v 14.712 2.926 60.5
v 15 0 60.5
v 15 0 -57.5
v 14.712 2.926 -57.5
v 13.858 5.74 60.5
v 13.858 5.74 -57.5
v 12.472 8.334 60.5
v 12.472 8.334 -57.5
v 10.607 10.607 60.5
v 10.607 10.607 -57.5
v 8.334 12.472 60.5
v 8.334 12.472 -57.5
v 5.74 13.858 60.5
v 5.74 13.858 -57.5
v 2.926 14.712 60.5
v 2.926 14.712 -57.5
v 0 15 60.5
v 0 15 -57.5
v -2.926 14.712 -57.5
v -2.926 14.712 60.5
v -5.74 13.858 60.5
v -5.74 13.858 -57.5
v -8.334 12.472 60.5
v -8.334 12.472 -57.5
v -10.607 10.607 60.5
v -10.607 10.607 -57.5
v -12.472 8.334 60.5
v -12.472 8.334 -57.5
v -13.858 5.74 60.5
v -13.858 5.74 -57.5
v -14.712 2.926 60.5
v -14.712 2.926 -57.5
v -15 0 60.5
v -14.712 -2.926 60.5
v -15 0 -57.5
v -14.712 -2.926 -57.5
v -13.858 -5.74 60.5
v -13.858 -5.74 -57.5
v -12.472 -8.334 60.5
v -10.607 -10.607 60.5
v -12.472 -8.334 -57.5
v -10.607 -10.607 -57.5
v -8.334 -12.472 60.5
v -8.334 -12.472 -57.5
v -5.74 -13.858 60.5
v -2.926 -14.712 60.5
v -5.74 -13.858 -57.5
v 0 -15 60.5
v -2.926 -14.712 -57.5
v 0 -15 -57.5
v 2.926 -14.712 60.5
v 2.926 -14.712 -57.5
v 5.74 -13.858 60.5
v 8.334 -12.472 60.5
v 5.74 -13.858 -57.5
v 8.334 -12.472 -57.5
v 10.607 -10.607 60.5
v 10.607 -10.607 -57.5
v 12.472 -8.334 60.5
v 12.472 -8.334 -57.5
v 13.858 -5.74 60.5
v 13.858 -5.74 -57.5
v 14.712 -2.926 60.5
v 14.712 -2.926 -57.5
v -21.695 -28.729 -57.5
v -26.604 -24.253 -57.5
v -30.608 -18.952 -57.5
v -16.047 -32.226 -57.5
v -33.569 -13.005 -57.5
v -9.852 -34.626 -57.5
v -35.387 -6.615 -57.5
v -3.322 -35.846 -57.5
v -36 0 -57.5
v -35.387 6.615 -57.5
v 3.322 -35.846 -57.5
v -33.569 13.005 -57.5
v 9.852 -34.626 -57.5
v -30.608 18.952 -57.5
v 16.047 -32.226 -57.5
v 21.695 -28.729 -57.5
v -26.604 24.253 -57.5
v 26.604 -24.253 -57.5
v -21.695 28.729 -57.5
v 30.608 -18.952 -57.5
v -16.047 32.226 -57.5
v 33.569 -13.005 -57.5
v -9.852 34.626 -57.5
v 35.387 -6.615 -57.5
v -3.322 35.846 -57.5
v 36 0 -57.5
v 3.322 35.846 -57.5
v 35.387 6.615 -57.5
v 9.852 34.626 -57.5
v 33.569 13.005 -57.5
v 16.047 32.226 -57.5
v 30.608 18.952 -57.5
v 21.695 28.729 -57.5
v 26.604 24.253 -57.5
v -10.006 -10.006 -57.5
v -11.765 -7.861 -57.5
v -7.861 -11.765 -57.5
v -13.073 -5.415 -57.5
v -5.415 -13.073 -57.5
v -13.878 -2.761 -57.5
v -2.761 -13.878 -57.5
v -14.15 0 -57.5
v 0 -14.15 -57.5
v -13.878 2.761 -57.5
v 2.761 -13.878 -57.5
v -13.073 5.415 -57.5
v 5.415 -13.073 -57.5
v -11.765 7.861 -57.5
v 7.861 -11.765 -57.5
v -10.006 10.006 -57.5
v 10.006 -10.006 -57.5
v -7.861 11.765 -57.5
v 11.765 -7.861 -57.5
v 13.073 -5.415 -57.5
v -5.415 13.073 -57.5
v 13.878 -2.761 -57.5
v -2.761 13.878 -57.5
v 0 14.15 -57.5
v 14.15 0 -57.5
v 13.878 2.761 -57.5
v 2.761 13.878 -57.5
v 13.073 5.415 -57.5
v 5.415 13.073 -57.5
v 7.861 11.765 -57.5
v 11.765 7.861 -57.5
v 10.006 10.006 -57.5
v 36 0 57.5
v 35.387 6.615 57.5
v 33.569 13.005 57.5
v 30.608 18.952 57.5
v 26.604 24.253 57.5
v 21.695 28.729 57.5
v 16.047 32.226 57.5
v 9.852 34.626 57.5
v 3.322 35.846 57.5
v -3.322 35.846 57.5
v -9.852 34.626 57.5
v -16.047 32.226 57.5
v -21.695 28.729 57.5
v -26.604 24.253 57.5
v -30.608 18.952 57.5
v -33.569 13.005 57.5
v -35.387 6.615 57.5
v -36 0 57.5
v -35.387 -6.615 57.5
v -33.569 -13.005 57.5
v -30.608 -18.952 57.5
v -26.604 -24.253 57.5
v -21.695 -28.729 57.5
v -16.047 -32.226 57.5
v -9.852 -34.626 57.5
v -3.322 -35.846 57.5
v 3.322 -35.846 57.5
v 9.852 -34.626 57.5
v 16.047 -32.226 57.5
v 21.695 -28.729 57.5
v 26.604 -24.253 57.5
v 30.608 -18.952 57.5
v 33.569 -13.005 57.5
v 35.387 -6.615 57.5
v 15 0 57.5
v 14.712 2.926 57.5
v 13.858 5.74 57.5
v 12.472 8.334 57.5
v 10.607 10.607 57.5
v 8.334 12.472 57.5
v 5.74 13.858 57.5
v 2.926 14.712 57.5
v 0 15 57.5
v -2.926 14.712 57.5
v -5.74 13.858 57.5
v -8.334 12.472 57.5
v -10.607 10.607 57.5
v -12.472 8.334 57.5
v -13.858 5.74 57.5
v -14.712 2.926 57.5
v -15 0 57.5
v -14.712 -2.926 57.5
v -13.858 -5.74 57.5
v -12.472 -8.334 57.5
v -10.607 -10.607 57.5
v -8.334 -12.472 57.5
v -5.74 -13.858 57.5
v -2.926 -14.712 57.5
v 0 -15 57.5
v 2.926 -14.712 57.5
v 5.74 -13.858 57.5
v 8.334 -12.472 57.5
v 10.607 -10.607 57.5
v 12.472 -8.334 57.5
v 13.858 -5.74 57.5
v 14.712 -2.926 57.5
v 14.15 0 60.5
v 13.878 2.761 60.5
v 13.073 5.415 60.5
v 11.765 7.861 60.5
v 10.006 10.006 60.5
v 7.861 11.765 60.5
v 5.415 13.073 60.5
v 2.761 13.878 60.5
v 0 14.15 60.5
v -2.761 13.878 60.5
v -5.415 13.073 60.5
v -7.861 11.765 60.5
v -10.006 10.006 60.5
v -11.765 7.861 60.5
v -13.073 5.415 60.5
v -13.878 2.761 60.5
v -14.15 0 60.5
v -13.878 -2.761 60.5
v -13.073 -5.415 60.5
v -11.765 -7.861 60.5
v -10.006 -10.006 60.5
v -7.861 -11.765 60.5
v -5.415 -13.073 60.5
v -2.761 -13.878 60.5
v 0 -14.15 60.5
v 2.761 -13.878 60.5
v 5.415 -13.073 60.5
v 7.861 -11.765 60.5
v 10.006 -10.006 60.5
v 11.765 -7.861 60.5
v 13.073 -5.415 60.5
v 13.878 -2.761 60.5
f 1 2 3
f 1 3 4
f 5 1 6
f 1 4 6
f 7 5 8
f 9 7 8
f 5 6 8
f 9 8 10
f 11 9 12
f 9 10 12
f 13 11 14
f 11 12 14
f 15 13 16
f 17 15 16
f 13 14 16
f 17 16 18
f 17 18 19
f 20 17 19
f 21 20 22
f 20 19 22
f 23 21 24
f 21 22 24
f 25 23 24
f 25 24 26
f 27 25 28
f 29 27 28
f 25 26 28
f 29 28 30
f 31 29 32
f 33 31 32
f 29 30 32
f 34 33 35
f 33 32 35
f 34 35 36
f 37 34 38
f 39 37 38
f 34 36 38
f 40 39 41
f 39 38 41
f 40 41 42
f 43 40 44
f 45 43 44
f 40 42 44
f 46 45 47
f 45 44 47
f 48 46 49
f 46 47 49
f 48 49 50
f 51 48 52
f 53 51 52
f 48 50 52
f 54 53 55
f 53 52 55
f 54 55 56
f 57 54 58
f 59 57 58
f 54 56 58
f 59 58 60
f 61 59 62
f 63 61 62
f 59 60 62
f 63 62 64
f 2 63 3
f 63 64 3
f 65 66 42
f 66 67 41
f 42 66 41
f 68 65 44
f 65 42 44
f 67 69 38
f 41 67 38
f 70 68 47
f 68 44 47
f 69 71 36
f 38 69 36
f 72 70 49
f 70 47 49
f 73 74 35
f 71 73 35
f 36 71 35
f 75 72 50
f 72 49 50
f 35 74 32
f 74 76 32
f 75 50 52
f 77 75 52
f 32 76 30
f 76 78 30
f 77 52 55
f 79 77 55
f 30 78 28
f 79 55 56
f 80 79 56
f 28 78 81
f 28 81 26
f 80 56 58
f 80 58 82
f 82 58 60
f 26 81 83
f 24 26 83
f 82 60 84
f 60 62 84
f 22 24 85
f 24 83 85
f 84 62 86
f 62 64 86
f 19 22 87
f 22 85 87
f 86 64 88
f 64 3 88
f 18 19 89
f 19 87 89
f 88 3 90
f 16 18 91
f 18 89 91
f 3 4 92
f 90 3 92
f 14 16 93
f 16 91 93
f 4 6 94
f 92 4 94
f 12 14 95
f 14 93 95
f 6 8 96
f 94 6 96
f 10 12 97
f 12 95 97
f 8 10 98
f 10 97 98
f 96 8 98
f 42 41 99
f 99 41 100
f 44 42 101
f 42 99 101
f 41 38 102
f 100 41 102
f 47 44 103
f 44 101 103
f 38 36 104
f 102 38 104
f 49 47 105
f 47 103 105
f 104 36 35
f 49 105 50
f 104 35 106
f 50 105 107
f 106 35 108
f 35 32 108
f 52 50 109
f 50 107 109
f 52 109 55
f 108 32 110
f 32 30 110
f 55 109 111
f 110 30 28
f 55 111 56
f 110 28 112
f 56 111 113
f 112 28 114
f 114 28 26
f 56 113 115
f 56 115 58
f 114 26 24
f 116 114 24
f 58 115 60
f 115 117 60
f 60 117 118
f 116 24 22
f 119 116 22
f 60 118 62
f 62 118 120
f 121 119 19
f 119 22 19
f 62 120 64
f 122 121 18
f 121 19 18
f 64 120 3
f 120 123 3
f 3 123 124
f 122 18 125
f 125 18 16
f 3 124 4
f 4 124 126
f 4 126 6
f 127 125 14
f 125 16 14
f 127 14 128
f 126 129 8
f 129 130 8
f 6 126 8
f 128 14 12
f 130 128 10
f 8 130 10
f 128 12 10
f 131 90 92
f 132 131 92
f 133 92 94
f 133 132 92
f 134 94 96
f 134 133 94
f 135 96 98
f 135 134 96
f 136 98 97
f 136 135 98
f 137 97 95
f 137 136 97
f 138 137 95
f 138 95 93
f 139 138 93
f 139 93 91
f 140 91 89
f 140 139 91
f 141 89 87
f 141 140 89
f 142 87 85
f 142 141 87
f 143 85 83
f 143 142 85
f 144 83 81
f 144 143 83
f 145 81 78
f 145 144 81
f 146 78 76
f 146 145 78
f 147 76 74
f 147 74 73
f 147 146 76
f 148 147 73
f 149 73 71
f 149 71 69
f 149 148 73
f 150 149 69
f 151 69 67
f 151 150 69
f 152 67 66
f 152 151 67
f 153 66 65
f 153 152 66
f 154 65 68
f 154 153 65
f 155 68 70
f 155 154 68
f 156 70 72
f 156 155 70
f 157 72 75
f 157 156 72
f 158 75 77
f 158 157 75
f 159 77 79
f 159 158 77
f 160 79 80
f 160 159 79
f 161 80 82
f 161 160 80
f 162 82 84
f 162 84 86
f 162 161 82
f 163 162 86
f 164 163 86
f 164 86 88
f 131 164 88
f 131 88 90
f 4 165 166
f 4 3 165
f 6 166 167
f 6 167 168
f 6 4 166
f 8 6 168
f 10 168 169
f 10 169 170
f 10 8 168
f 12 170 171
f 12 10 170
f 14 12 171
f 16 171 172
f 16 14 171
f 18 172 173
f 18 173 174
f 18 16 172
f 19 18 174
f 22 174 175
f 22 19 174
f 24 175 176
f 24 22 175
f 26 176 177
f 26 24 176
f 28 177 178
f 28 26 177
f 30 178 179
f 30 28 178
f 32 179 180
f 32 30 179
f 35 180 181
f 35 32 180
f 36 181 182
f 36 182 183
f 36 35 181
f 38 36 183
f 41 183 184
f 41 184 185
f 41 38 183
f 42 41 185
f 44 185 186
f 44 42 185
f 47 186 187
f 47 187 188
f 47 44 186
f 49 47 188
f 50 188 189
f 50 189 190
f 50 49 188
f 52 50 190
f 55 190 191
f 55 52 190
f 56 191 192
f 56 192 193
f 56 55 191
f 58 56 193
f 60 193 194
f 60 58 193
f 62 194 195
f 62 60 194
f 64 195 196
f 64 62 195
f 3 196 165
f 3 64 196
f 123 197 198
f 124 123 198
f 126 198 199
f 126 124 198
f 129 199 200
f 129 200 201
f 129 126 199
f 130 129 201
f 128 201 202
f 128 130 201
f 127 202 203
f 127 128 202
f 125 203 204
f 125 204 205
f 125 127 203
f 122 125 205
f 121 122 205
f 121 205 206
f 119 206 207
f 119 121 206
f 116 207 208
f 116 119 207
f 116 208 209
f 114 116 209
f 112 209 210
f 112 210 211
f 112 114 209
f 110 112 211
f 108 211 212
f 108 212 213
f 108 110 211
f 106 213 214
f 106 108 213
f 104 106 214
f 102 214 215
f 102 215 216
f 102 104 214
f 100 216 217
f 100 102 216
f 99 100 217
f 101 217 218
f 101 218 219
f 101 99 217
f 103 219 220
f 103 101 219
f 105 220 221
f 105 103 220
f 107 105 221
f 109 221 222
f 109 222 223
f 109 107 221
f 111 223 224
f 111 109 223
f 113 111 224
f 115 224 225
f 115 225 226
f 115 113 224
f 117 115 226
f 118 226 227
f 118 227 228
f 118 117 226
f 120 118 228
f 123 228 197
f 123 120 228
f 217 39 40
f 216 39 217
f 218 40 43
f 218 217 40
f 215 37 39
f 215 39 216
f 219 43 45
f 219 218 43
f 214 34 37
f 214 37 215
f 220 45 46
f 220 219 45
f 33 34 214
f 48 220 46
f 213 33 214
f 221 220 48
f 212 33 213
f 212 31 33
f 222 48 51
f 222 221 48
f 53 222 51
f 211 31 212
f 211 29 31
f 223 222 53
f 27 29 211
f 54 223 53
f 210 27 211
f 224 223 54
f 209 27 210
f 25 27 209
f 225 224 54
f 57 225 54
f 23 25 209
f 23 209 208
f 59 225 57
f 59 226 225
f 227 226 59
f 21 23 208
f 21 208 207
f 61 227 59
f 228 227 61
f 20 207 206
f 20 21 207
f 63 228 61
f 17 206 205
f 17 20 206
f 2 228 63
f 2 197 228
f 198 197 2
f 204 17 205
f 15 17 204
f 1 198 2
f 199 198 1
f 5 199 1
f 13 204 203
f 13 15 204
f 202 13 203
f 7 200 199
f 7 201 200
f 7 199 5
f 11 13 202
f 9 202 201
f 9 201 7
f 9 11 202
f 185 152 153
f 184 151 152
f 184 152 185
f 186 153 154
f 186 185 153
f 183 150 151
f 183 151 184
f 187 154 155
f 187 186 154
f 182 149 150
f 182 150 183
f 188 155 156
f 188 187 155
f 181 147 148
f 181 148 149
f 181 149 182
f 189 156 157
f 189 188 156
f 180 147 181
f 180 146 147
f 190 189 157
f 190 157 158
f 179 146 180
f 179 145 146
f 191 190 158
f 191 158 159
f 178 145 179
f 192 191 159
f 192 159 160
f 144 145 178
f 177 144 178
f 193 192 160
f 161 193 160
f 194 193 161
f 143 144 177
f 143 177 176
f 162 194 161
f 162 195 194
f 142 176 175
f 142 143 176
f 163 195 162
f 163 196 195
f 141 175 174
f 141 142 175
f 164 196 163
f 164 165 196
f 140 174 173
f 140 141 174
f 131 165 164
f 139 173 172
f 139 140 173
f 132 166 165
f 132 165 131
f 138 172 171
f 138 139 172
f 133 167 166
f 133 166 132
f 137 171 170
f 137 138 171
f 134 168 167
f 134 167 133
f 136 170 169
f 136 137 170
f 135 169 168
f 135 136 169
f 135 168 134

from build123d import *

# Parameters (mm, degrees)
SKETCH_1_R           = 36
SKETCH_1_R_2         = 15
EXTRUDE_1_DEPTH      = 57.5
EXTRUDE_2_DEPTH      = 60.5
EXTRUDE_2_DEPTH_BACK = 57.5
SKETCH_2_R           = 15
SKETCH_2_R_2         = 14.15


with BuildPart() as part:
    # 草图1 → 凸台-拉伸1 (new, symmetric)
    with BuildSketch(Plane.XY):
        Circle(SKETCH_1_R)
        Circle(SKETCH_1_R_2, mode=Mode.SUBTRACT)
    extrude(amount=EXTRUDE_1_DEPTH, both=True)


with BuildPart() as body_2:
    # 草图2 → 凸台-拉伸2 (new, two sides: drawn at the far end of the back side and taken through both)
    with BuildSketch(Plane.XY.offset(-EXTRUDE_2_DEPTH_BACK)):
        Circle(SKETCH_2_R)
        Circle(SKETCH_2_R_2, mode=Mode.SUBTRACT)
    extrude(amount=EXTRUDE_2_DEPTH + EXTRUDE_2_DEPTH_BACK)


solid = Compound([part.part, body_2.part])
